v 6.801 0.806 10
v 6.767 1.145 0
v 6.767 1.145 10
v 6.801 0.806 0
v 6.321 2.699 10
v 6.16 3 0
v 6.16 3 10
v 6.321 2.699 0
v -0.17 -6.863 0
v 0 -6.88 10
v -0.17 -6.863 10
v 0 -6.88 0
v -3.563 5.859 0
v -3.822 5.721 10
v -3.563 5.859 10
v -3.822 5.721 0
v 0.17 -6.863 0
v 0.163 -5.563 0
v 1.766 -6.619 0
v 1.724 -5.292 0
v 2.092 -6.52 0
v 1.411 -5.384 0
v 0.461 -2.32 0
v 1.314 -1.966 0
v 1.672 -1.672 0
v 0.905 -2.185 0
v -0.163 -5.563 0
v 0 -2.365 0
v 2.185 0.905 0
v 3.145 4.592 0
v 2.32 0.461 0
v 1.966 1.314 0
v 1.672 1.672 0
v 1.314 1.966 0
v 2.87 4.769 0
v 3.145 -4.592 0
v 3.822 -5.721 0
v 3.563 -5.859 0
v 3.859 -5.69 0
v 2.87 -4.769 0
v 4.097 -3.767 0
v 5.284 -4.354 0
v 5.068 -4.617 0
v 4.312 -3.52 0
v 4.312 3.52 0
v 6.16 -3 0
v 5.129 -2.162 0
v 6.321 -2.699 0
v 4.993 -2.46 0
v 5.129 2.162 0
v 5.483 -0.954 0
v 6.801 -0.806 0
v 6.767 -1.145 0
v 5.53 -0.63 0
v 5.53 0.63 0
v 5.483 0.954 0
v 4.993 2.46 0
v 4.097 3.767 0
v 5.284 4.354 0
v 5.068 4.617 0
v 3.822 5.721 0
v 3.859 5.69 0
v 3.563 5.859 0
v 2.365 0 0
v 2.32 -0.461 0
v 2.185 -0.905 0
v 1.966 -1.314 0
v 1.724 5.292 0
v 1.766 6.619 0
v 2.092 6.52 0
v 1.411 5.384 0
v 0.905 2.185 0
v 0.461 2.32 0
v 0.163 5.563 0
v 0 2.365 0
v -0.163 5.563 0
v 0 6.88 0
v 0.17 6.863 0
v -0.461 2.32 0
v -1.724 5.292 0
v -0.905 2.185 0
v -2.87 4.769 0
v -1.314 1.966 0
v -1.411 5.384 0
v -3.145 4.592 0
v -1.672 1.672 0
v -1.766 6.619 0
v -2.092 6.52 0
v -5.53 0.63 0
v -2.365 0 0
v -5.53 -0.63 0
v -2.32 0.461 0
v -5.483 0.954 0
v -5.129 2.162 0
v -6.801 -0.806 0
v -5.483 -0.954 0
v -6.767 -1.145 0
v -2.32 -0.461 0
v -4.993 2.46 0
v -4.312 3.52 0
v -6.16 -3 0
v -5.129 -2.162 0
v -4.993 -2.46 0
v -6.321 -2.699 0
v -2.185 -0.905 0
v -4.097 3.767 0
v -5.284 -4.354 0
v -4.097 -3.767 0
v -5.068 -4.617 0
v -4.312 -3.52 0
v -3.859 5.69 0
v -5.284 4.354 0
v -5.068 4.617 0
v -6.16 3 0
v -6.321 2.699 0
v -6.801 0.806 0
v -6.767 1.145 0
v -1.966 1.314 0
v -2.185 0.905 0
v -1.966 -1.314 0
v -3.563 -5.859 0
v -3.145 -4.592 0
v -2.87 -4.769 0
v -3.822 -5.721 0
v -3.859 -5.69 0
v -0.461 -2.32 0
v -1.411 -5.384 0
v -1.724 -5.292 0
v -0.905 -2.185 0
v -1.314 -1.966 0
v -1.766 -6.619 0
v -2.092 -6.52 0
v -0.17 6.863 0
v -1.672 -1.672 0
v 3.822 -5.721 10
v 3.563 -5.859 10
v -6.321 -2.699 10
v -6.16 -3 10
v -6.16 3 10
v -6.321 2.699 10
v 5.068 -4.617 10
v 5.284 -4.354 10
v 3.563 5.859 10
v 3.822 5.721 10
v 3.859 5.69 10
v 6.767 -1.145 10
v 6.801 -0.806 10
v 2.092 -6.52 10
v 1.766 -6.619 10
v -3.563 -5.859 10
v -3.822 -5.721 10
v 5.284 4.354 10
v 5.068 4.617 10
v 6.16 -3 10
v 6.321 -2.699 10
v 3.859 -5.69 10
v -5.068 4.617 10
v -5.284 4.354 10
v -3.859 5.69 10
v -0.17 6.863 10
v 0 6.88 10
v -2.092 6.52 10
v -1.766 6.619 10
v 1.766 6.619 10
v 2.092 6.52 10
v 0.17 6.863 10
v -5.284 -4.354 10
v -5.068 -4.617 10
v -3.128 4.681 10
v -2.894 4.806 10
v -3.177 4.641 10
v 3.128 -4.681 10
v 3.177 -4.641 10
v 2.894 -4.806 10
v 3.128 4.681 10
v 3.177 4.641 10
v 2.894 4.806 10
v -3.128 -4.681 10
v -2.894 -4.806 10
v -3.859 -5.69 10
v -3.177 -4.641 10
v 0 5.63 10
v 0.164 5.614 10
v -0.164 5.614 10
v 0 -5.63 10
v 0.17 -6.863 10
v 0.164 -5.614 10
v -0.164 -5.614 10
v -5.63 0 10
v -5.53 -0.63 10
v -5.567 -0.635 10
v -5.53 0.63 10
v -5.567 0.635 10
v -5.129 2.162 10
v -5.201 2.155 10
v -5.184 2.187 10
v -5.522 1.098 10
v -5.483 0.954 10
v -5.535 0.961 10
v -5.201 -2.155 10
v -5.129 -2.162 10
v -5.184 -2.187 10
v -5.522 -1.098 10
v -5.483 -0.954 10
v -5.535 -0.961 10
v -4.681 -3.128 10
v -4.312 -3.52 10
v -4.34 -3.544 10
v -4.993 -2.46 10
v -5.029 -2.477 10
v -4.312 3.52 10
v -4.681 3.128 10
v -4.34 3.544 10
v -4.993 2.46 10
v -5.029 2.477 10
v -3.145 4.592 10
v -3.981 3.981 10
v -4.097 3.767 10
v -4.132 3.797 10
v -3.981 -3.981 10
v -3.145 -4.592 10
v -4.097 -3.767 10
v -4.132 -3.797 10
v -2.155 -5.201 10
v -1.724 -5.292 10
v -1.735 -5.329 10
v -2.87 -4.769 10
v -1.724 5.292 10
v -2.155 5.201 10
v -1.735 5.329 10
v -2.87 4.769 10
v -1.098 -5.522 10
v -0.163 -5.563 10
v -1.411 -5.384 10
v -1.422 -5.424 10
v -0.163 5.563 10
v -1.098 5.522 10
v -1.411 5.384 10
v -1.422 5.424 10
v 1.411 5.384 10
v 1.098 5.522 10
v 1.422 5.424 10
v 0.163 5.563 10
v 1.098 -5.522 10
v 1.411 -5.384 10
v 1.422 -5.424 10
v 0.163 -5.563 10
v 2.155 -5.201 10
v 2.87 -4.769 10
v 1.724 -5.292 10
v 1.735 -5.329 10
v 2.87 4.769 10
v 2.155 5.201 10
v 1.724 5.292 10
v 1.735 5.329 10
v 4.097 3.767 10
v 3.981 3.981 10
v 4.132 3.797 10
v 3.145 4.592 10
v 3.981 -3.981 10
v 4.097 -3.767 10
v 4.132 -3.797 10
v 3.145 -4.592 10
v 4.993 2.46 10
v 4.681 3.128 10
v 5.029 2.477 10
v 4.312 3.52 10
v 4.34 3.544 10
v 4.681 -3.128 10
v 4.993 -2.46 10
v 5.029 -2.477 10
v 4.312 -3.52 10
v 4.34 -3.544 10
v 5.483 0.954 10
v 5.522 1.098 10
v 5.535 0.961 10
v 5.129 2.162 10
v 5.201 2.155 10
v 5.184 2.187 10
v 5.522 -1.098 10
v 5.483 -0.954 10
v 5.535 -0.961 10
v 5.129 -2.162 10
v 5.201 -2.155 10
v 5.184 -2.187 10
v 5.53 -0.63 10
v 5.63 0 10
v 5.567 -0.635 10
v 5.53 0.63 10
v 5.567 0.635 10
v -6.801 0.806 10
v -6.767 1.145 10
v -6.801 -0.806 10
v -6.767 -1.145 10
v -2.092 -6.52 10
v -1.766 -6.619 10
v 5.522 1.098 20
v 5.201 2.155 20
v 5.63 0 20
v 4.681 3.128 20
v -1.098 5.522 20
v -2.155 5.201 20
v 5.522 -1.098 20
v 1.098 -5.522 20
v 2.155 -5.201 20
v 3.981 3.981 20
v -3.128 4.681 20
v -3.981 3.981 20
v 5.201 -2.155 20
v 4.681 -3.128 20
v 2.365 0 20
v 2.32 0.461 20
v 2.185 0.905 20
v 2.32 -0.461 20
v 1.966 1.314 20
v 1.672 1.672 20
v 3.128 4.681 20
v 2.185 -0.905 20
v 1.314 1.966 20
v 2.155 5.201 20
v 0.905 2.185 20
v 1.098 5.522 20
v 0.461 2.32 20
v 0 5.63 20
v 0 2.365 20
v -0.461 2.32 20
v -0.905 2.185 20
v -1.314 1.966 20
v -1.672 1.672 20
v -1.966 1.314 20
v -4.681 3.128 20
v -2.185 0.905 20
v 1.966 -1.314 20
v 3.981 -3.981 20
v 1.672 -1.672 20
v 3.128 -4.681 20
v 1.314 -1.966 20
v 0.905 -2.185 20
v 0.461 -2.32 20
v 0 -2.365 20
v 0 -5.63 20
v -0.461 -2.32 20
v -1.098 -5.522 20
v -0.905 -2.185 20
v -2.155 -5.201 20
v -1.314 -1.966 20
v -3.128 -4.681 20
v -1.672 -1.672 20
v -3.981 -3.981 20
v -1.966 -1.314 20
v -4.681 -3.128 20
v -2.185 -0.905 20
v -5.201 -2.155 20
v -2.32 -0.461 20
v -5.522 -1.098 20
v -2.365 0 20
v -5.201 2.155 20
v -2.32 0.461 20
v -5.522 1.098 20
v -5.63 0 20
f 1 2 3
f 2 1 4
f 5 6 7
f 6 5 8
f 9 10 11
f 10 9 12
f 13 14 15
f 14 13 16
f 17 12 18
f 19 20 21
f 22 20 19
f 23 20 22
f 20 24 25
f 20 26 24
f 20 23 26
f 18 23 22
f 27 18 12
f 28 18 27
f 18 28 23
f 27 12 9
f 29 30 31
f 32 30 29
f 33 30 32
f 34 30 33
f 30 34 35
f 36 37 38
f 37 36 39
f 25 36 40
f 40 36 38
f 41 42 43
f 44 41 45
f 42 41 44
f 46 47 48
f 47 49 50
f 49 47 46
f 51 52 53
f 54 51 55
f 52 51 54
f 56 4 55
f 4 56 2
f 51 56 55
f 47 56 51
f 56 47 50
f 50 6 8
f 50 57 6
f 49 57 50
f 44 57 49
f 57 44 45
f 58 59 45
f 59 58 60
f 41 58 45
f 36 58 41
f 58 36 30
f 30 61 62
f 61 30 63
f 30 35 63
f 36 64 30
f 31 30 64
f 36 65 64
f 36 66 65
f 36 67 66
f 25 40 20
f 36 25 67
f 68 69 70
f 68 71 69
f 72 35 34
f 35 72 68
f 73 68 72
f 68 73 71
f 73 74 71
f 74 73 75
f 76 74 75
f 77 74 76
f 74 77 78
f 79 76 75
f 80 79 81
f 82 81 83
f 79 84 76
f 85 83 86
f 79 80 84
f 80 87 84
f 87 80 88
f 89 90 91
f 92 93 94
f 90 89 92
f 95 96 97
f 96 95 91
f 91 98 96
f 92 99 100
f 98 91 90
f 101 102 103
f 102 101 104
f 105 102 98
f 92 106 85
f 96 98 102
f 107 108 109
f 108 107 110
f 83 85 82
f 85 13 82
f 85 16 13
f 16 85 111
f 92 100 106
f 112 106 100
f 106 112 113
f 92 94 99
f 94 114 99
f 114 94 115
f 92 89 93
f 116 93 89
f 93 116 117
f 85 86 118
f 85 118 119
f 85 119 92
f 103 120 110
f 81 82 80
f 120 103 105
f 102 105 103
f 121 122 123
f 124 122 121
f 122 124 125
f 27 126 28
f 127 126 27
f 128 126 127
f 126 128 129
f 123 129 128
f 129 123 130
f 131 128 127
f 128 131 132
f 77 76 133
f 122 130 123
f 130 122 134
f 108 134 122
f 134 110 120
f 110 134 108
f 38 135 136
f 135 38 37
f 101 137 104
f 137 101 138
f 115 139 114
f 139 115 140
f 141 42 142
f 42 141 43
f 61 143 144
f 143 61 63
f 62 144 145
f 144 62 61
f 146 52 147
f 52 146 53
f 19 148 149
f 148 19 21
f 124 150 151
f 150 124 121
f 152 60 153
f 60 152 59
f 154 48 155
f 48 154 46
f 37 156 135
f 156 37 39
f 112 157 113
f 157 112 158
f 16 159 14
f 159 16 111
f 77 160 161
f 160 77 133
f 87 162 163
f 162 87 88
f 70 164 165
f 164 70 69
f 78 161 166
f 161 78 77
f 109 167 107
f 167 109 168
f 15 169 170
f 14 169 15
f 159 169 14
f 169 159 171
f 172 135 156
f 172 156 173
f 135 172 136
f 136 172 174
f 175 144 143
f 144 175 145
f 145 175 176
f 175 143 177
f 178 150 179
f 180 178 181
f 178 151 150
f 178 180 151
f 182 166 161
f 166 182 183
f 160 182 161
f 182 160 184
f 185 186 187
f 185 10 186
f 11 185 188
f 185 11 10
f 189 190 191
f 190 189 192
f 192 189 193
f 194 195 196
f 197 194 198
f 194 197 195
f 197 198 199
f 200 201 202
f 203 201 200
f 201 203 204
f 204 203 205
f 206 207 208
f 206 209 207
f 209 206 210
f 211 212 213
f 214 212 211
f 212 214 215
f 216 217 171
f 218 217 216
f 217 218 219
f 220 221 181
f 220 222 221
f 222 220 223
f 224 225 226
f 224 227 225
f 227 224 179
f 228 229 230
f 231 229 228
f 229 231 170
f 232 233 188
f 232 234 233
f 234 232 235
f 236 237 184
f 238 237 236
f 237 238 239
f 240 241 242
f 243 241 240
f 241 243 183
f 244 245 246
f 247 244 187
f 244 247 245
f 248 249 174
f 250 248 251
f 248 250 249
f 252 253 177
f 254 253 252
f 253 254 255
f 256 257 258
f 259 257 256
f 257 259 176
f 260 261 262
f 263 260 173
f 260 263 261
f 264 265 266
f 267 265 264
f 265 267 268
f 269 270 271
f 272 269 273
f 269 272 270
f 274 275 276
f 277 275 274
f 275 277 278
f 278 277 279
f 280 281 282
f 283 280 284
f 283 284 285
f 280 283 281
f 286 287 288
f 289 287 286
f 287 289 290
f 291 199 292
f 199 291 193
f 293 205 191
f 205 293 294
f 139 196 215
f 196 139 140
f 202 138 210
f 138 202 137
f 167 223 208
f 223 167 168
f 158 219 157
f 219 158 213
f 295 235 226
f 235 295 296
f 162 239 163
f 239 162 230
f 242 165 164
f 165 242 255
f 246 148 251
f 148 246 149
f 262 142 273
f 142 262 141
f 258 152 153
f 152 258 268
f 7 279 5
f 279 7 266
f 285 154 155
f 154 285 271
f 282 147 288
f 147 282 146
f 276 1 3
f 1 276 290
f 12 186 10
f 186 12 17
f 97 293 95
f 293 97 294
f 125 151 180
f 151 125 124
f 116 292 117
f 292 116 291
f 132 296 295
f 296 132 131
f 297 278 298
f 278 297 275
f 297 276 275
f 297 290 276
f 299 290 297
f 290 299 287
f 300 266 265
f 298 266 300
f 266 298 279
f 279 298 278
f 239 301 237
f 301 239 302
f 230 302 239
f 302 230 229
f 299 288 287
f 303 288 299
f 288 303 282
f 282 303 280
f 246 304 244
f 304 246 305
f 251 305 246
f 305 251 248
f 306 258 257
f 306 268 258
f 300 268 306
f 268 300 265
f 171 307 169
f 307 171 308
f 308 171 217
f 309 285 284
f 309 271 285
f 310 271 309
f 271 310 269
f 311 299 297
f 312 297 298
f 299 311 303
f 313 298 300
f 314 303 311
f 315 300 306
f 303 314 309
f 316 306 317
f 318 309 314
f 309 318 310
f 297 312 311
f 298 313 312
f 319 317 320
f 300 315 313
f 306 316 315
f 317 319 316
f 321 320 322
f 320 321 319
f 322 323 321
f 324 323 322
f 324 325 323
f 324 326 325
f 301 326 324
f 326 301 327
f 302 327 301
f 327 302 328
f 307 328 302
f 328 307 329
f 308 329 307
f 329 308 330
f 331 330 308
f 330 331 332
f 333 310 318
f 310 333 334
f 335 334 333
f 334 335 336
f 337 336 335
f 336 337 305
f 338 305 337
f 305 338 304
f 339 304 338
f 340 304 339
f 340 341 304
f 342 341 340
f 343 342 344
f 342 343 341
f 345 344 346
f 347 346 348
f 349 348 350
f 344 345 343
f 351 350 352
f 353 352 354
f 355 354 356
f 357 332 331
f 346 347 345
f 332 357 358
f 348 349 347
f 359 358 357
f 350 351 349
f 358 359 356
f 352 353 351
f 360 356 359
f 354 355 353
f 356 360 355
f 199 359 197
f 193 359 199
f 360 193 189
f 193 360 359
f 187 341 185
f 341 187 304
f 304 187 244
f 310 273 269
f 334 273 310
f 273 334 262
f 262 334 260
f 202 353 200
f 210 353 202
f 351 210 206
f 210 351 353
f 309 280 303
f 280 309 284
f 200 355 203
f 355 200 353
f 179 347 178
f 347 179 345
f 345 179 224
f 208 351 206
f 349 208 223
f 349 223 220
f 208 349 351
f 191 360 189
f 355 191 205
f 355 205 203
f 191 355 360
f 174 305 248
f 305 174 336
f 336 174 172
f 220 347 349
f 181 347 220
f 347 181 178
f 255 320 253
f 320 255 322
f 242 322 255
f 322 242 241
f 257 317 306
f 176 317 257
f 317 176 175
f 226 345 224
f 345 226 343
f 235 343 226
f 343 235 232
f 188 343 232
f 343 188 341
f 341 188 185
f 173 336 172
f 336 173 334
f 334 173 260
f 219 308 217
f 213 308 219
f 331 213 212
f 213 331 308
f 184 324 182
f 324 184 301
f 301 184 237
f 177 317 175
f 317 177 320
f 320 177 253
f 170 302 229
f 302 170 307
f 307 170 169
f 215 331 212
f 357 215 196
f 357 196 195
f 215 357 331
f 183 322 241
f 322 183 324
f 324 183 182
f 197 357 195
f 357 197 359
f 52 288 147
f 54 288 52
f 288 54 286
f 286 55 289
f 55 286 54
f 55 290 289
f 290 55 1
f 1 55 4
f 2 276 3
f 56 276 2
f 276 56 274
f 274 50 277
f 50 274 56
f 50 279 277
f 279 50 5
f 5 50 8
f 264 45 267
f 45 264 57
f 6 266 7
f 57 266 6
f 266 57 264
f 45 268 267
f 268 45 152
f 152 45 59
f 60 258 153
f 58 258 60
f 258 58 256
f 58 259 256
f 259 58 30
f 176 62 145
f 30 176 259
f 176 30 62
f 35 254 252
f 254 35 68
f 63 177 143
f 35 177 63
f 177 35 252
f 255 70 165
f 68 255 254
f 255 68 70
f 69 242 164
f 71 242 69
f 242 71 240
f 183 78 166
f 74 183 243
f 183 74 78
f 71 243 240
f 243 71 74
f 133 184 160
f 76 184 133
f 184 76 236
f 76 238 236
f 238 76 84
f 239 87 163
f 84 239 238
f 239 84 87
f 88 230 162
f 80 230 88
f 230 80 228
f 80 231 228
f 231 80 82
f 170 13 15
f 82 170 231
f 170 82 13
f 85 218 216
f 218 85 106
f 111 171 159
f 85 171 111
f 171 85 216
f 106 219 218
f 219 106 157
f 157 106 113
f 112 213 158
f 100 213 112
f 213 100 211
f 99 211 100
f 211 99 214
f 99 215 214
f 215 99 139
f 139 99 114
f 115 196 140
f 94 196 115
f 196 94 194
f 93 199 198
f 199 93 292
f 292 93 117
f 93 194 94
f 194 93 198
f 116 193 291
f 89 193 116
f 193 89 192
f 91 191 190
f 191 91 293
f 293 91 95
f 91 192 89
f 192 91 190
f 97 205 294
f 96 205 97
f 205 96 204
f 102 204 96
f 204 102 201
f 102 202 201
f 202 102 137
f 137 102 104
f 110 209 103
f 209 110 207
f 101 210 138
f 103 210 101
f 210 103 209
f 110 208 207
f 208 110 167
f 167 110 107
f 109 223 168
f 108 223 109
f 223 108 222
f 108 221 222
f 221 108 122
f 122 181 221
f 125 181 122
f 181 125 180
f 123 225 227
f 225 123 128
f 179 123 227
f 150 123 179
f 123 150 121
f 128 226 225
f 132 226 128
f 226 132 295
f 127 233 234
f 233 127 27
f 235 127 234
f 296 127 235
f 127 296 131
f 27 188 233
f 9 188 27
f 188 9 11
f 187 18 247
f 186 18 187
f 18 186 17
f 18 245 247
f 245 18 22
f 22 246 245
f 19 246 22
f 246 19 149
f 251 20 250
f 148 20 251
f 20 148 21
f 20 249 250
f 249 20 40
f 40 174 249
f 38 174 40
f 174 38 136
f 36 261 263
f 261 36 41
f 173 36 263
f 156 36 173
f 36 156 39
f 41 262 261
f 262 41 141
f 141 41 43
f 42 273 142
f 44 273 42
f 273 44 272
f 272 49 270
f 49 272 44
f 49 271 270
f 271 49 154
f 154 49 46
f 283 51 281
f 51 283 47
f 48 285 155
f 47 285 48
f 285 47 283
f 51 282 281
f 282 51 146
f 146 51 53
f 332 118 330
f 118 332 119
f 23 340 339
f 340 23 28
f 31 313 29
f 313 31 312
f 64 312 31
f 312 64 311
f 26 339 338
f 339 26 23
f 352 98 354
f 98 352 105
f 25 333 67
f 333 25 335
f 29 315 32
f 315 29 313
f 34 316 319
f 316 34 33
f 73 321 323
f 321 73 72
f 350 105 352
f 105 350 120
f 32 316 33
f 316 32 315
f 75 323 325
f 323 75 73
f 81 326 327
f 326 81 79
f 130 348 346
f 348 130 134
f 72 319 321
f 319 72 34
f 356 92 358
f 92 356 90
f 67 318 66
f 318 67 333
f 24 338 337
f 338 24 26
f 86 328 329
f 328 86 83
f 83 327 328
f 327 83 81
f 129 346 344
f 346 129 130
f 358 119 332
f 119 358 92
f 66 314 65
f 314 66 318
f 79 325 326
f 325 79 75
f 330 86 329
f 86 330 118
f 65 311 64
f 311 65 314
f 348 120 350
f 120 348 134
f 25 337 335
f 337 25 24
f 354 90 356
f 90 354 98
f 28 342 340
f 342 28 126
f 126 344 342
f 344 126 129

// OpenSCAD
$fn = 32;

// ----------------------------------------------------------------------
// Timing pulley: GT2 22T, pitch 2 mm, 13.76 mm x 20 mm
// ----------------------------------------------------------------------

// --- parameters (mm) ---
pitch = 2;                // belt pitch
teeth = 22;               // number of grooves
belt_w = 10;              // belt width between the flanges
tip_d = 13.76;            // tip circle diameter
root_d = 12.26;           // groove bottom diameter
groove_h = 0.75;          // groove depth
tooth_w = 1.5;            // groove width at the tip circle
bore_d = 4.73;            // shaft bore
hub_d = 11.26;            // hub diameter
hub_h = 10;               // hub above the flange
bottom_z = 0;             // lowest point of the pulley
top_z = 20;               // highest point of the pulley

module rim() {
  cylinder(h = belt_w, d = tip_d);
}

module groove_cutter() {
  /* belt tooth groove: deeper than wide, cut through the belt width */
  translate([root_d / 2, 0, 0])
    linear_extrude(height = belt_w)
      polygon(points = [[-0.6, -tooth_w * 0.42], [groove_h + 0.6, -tooth_w * 0.6],
                        [groove_h + 0.6, tooth_w * 0.6], [-0.6, tooth_w * 0.42]]);
}

module hub() {
  translate([0, 0, bottom_z]) cylinder(h = top_z - bottom_z, d = hub_d);
}

difference() {
  union() {
    rim();
    hub();
  }
  for (i = [0 : teeth - 1]) rotate([0, 0, i * 360 / teeth]) groove_cutter();
  translate([0, 0, bottom_z - 1]) cylinder(h = top_z - bottom_z + 2, d = bore_d);
}
